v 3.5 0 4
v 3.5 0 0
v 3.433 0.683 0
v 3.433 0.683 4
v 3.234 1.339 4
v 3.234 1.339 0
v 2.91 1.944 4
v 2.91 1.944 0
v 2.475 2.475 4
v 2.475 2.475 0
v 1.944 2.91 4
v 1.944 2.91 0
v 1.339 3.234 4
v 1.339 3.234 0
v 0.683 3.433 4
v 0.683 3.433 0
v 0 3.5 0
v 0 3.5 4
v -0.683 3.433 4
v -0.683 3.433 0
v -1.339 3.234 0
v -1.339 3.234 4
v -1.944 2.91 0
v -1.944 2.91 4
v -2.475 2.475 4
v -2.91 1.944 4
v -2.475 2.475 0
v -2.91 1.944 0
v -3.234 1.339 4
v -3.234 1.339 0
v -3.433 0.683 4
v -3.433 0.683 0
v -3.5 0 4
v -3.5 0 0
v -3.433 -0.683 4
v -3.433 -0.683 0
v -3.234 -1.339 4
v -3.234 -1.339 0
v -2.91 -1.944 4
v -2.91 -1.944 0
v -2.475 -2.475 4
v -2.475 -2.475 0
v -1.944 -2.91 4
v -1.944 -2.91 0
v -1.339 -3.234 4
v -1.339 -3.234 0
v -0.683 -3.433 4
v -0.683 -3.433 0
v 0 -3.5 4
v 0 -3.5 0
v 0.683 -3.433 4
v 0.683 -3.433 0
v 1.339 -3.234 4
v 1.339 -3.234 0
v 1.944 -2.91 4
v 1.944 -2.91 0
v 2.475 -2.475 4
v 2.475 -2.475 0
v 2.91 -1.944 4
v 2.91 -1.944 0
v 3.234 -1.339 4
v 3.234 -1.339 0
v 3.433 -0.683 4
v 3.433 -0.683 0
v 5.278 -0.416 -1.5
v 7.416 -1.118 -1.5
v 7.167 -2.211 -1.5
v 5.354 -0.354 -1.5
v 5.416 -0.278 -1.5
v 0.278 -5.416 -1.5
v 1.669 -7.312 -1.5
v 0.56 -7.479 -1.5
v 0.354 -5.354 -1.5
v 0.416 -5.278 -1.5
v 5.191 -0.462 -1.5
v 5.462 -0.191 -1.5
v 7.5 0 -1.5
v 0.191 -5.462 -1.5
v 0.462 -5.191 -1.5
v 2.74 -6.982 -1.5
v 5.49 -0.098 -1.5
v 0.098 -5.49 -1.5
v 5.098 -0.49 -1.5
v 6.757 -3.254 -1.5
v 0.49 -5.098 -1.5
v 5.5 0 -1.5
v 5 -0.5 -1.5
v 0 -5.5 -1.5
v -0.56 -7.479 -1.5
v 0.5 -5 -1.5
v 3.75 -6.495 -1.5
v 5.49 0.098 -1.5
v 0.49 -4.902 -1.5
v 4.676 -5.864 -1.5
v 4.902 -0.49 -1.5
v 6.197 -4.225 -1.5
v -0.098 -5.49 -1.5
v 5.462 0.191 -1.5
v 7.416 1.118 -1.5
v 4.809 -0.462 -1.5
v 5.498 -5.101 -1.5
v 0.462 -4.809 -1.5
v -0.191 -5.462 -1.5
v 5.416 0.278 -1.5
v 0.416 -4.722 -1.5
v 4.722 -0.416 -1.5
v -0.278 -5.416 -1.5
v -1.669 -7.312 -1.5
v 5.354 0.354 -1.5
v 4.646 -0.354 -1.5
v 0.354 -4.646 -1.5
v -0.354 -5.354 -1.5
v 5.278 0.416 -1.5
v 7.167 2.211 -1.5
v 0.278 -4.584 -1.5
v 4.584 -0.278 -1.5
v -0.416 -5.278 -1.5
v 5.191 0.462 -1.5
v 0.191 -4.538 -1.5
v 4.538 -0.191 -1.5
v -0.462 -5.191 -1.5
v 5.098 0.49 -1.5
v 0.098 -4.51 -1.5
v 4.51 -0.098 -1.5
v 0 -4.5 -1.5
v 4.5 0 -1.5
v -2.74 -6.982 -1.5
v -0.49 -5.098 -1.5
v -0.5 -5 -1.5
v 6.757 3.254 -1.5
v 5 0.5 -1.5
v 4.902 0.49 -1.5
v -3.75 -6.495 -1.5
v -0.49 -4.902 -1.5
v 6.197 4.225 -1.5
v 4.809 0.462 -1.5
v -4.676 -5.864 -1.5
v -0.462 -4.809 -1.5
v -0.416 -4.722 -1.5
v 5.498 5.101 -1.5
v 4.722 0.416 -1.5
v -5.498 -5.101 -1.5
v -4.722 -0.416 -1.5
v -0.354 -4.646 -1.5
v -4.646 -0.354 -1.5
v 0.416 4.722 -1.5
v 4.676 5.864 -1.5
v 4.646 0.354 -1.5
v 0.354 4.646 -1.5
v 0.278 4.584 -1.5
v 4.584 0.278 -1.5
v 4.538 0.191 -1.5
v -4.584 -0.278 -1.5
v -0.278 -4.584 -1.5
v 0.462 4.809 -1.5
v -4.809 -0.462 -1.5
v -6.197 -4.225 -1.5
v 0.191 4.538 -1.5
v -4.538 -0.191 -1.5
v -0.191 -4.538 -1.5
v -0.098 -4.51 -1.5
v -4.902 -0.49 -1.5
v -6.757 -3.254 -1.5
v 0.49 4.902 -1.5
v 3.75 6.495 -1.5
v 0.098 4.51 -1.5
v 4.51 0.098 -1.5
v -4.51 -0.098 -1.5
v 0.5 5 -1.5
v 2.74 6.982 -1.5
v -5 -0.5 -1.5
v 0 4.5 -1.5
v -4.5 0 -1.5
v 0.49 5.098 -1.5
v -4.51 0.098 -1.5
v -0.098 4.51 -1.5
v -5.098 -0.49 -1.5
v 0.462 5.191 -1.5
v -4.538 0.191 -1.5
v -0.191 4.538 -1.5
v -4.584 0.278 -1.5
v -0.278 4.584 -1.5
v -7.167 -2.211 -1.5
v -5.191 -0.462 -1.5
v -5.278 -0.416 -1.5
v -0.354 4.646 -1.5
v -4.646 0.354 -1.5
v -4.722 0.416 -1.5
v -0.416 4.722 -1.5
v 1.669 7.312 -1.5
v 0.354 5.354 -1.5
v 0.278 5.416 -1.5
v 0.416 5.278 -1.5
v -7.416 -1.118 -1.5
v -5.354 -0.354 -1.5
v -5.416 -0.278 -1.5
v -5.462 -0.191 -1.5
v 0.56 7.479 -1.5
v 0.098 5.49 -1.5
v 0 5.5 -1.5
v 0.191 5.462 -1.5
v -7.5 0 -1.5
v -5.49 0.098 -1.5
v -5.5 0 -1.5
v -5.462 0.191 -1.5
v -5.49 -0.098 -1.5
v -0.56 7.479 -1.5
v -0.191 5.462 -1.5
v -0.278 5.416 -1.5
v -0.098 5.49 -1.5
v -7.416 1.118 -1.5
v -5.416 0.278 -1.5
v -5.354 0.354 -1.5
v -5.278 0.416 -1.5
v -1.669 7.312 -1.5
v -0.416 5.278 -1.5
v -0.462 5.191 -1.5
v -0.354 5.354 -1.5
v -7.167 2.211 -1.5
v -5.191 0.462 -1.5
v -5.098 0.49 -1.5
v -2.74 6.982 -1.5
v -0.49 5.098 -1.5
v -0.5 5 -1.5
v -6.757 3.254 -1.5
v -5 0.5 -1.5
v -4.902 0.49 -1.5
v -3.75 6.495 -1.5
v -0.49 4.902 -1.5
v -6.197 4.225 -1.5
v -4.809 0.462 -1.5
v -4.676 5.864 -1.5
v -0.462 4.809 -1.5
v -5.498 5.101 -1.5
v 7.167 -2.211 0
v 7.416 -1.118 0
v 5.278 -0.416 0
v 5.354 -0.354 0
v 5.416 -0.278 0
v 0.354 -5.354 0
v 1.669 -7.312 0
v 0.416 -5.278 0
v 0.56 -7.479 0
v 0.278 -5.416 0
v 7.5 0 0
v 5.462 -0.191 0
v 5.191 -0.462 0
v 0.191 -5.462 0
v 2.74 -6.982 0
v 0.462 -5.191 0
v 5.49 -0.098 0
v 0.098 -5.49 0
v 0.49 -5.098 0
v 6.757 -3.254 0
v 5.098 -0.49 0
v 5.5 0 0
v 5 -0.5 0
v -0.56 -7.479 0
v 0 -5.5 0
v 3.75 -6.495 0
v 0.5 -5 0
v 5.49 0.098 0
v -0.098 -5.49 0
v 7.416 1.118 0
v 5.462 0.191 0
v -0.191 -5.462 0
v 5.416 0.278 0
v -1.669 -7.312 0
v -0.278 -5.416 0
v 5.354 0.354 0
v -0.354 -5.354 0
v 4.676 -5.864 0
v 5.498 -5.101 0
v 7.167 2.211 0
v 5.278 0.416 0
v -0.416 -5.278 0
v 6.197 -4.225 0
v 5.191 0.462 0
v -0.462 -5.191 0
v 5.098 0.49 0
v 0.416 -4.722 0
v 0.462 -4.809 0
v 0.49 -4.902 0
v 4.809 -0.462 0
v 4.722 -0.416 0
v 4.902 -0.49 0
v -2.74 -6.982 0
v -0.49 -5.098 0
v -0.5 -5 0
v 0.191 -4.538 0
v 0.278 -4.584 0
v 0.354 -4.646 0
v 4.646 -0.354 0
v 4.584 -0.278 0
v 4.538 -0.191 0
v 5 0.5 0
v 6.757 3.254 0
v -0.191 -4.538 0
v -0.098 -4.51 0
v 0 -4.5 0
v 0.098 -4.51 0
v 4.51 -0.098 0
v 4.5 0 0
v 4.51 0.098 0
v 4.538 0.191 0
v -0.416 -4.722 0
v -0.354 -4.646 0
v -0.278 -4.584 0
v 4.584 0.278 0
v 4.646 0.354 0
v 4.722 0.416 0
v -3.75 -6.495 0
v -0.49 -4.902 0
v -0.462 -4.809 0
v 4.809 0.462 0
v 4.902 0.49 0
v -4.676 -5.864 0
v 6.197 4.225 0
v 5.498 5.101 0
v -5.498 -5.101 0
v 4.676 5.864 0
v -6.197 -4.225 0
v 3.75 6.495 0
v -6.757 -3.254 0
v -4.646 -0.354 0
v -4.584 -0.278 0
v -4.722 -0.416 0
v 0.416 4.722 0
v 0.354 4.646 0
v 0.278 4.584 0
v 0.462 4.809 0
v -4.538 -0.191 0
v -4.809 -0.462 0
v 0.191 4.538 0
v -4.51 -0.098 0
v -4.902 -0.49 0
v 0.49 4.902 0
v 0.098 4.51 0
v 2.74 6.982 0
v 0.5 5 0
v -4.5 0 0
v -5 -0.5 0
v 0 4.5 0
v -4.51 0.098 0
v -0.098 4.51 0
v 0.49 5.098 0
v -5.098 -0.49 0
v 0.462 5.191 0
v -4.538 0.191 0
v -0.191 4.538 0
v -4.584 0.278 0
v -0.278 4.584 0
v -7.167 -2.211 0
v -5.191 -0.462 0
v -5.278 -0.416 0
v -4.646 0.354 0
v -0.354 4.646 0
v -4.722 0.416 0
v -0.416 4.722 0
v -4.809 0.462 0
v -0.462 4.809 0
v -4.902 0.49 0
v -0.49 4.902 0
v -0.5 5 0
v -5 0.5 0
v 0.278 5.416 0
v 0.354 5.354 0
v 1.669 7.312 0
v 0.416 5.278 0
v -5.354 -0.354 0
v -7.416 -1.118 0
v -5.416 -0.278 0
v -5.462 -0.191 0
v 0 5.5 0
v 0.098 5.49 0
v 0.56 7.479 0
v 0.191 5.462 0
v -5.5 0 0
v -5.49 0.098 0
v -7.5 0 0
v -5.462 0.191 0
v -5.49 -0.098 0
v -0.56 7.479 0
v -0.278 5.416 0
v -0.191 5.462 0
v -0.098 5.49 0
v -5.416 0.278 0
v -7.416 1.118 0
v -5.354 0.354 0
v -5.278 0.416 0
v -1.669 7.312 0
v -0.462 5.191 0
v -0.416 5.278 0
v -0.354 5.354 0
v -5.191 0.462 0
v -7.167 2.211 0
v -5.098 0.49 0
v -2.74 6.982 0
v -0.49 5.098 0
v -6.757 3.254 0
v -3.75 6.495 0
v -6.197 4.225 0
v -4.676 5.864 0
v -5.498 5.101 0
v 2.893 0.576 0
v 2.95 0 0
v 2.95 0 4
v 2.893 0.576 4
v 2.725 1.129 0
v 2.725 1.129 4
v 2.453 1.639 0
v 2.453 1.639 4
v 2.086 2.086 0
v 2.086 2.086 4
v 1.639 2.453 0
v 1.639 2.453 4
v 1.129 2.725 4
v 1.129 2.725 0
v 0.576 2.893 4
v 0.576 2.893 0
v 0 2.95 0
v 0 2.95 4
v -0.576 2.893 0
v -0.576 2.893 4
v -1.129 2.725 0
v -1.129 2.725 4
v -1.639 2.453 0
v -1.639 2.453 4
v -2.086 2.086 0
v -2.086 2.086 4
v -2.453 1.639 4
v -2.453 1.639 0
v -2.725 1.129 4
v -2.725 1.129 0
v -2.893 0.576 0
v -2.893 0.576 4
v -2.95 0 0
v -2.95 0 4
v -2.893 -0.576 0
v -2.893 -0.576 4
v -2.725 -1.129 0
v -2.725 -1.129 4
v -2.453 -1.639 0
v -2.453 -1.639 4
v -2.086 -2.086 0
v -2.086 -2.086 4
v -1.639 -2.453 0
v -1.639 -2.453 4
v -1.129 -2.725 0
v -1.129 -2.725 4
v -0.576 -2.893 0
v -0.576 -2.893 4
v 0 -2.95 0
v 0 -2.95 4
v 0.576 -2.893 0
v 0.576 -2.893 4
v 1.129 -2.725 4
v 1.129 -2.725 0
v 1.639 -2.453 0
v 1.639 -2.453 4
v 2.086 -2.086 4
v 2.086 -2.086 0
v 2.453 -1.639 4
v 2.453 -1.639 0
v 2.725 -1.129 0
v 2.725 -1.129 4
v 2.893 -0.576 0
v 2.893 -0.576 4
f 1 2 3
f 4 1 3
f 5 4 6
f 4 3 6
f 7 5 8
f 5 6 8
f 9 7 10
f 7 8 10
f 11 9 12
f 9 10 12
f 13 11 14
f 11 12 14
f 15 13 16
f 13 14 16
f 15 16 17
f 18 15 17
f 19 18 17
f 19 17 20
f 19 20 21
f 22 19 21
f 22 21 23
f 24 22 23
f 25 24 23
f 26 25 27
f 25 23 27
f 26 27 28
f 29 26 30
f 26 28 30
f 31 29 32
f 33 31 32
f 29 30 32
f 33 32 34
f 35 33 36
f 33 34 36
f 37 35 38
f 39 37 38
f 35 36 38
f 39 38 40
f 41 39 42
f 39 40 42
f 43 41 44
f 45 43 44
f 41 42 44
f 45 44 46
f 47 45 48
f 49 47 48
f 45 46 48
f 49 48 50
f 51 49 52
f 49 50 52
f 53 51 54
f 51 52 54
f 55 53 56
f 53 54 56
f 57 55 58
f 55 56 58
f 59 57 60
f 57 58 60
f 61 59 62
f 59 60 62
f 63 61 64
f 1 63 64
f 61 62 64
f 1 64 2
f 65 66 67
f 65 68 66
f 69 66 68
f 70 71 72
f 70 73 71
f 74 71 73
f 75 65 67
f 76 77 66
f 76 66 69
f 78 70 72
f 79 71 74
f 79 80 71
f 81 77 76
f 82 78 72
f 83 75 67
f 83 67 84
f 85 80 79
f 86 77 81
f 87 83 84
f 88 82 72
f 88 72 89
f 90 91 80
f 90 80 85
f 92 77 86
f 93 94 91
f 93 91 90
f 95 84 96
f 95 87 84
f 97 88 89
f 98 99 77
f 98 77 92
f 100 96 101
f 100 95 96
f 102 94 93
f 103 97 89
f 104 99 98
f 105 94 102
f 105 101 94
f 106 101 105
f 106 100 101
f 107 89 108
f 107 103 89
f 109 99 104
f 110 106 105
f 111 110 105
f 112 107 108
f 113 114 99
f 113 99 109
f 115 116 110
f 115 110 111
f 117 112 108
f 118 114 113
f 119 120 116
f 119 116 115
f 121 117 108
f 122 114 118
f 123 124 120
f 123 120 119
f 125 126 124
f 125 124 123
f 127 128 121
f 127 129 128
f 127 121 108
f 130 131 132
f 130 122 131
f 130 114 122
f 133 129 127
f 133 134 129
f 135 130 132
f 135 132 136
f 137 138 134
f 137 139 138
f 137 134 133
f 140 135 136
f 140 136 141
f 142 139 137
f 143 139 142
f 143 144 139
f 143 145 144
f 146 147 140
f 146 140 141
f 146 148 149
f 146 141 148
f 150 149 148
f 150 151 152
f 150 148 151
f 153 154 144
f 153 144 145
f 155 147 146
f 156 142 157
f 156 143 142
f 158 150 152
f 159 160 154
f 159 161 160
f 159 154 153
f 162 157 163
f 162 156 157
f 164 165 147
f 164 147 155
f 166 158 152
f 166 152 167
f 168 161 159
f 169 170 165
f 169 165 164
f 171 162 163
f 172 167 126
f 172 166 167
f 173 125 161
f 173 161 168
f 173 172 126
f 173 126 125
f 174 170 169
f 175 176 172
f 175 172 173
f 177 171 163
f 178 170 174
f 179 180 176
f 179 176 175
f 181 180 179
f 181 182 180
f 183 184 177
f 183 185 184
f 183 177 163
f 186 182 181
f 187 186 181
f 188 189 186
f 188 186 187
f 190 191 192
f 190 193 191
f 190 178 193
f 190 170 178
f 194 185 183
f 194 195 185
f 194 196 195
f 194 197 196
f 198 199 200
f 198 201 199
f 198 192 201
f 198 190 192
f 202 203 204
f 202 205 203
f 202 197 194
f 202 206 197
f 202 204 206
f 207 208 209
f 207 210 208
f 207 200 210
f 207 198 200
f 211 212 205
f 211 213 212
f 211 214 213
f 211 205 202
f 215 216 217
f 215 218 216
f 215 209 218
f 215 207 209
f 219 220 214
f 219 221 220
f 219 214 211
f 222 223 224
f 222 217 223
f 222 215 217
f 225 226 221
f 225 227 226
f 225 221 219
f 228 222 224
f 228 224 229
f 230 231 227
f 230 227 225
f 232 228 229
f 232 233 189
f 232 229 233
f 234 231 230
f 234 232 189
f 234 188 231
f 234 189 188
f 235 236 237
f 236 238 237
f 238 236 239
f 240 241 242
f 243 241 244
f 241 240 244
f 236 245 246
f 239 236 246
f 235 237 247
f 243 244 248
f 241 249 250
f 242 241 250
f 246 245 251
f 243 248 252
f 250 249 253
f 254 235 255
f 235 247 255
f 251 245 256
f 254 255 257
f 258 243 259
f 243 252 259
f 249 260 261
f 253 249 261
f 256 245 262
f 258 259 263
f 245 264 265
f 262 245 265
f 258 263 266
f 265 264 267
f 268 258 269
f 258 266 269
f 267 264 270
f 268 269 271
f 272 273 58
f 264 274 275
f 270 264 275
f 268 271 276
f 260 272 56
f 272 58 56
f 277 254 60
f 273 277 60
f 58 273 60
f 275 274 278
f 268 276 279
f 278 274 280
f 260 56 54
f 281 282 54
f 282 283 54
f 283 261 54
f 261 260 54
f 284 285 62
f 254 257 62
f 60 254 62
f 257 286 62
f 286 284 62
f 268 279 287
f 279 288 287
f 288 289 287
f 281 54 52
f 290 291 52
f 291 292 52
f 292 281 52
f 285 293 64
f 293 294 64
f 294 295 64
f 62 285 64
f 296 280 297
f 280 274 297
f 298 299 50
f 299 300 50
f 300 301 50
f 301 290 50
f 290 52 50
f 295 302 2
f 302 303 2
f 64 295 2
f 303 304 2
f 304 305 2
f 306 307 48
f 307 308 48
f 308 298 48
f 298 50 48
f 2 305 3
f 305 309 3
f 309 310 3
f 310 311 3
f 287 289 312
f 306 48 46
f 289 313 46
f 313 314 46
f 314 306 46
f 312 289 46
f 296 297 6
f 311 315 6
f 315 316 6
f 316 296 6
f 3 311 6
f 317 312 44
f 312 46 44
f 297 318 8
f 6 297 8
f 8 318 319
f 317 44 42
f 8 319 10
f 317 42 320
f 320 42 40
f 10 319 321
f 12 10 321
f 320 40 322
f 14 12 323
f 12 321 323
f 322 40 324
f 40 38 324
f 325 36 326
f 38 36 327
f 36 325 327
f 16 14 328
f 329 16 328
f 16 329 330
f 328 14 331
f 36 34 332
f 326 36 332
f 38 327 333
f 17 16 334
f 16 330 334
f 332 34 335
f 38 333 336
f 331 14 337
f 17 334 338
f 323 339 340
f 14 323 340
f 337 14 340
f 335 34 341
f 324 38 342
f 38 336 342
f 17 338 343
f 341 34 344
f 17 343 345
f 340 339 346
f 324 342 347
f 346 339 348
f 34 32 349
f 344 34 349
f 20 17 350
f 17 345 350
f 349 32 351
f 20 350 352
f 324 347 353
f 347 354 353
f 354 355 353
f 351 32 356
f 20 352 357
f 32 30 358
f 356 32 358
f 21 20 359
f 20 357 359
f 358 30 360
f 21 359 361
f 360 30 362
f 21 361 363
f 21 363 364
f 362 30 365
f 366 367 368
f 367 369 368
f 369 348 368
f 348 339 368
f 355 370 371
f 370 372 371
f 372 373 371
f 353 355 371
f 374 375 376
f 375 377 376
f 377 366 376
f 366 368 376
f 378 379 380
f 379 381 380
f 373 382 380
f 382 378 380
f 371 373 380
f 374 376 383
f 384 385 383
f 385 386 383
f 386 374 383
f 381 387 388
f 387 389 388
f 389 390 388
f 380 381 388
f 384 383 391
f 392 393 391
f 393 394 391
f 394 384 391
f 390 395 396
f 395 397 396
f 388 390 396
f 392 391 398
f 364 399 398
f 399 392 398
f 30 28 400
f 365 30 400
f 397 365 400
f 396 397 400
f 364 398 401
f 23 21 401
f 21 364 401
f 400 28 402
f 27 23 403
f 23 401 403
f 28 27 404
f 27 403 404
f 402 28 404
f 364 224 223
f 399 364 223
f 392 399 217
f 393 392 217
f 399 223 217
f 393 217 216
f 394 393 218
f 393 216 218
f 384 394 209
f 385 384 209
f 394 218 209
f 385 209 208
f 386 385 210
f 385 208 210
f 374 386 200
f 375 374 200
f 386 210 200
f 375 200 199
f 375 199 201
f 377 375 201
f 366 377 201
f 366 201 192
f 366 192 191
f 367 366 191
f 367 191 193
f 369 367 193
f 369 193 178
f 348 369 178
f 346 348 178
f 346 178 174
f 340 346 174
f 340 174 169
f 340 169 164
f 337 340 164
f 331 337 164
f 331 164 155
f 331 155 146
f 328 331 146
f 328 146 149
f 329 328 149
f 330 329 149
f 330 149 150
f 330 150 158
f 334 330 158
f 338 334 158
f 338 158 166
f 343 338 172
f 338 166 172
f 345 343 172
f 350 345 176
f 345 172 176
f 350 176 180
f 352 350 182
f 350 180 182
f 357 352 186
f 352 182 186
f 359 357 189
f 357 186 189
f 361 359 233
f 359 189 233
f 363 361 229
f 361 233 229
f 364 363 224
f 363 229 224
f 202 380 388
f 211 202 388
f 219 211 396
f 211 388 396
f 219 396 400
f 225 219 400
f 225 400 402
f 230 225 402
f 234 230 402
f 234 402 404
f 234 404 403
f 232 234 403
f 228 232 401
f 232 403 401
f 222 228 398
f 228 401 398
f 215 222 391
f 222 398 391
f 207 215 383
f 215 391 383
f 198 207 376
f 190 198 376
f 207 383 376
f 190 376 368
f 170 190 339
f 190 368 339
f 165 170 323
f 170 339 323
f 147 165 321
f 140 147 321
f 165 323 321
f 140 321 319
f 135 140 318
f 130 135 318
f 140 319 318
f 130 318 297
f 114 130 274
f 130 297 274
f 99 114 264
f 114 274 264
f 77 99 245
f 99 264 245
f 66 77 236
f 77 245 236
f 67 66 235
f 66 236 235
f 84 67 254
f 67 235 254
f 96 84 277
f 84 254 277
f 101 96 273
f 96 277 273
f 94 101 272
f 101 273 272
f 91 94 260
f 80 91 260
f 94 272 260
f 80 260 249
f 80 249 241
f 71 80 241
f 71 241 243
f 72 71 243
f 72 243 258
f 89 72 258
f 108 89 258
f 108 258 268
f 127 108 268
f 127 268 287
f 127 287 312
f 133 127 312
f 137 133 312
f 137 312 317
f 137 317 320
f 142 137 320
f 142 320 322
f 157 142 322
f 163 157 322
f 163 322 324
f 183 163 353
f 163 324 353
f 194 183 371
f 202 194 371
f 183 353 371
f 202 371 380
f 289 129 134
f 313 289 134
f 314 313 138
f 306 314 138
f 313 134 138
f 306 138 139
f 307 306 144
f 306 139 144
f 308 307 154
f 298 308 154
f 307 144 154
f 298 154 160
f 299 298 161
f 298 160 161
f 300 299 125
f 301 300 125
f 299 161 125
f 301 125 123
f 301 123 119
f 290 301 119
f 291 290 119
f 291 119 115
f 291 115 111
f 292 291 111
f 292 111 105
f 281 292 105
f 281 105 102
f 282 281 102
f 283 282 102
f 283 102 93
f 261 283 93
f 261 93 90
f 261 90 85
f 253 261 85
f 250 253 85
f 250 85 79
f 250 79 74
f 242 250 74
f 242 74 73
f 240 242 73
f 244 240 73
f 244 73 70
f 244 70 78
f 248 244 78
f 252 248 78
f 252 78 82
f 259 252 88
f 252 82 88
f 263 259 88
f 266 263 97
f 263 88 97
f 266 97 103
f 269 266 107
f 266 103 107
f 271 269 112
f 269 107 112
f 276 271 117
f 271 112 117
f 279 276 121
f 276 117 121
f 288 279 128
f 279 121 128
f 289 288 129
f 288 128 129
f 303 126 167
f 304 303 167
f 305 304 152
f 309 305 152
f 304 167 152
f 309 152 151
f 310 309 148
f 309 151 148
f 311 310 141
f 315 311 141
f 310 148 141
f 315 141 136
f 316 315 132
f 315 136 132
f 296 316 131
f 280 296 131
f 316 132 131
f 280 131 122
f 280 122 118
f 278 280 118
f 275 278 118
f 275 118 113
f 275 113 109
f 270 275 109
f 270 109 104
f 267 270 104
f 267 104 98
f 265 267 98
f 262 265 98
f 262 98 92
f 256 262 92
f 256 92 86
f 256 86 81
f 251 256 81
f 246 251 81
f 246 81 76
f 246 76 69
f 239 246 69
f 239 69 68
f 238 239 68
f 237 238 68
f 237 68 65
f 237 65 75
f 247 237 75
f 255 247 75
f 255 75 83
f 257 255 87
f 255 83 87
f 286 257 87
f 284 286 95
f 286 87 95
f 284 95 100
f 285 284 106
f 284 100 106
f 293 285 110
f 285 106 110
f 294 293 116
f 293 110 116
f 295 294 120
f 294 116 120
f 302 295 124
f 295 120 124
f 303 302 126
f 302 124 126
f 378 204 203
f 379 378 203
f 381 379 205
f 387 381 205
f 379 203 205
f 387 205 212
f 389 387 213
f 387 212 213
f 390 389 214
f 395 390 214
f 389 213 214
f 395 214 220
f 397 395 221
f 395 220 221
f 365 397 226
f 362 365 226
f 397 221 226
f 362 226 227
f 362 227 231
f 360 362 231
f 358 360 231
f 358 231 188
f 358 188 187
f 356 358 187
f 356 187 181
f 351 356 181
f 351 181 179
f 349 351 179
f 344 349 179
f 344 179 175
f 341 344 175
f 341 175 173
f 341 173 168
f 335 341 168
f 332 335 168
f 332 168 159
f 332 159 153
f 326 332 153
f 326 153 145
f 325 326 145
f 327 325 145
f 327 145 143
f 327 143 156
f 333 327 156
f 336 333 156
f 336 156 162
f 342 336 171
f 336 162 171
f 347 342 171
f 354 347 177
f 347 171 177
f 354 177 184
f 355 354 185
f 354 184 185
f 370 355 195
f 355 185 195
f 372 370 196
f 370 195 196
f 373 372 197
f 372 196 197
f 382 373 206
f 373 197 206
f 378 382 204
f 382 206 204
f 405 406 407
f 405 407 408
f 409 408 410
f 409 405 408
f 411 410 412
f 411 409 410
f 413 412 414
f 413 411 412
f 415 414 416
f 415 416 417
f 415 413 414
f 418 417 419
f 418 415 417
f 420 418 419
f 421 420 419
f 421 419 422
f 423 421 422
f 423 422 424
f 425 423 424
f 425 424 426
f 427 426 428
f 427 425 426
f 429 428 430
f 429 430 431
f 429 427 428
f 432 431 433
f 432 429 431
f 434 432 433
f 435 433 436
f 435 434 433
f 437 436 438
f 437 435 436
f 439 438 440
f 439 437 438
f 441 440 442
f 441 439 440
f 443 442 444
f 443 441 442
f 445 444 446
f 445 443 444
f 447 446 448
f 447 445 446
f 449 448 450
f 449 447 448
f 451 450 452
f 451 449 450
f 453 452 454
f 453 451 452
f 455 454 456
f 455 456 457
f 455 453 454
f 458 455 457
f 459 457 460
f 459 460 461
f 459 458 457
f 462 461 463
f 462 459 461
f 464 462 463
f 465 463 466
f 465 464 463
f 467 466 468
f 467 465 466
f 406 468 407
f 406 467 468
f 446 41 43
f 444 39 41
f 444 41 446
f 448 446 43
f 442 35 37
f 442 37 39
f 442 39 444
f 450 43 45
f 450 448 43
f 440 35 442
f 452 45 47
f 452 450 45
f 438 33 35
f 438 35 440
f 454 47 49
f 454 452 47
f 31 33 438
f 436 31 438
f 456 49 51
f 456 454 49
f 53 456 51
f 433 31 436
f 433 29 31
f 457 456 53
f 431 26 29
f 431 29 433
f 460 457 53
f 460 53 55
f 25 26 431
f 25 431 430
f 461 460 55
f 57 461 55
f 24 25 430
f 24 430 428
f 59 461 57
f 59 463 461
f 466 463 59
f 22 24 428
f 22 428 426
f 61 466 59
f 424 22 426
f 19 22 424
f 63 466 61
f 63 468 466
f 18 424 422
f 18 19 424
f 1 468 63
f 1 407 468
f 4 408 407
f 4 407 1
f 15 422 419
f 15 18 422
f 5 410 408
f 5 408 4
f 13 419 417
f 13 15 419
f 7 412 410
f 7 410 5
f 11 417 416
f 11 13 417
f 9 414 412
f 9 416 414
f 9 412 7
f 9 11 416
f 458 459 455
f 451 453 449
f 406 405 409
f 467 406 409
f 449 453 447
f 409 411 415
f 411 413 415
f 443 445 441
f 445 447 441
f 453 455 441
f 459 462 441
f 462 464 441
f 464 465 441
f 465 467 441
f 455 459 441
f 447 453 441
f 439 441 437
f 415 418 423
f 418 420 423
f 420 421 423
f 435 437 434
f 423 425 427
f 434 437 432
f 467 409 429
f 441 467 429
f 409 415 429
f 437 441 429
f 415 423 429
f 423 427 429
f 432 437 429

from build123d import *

# Parameters (mm, degrees)
ESQUISSE1_R             = 3.5
ESQUISSE1_R_2           = 2.95
BOSS_EXTRU_1_DEPTH      = 4
ESQUISSE2_R             = 7.5
BOSS_EXTRU_2_DEPTH      = 1.5
ESQUISSE3_R             = 0.5
ENL_V_MAT_EXTRU_3_DEPTH = 2


with BuildPart() as part:
    # Esquisse1 → Boss.-Extru.1 (new body)
    with BuildSketch(Plane.XY):
        Circle(ESQUISSE1_R)
        Circle(ESQUISSE1_R_2, mode=Mode.SUBTRACT)
    extrude(amount=BOSS_EXTRU_1_DEPTH)

    # Esquisse2 → Boss.-Extru.2 (add)
    with BuildSketch(Plane(origin=(0, 0, 0), x_dir=(-1, 0, 0), z_dir=(0, 0, -1))):
        Circle(ESQUISSE2_R)
    extrude(amount=BOSS_EXTRU_2_DEPTH)

    # Esquisse3 → Enlèv. mat.-Extru.3 (cut)
    with BuildSketch(Plane(origin=(0, 0, -1.5), x_dir=(-1, 0, 0), z_dir=(0, 0, -1))):
        with Locations((0, 5)):
            Circle(ESQUISSE3_R)
        with Locations((5, 0)):
            Circle(ESQUISSE3_R)
        with Locations((0, -5)):
            Circle(ESQUISSE3_R)
        with Locations((-5, 0)):
            Circle(ESQUISSE3_R)
    extrude(amount=-ENL_V_MAT_EXTRU_3_DEPTH, mode=Mode.SUBTRACT)


solid = part.part
